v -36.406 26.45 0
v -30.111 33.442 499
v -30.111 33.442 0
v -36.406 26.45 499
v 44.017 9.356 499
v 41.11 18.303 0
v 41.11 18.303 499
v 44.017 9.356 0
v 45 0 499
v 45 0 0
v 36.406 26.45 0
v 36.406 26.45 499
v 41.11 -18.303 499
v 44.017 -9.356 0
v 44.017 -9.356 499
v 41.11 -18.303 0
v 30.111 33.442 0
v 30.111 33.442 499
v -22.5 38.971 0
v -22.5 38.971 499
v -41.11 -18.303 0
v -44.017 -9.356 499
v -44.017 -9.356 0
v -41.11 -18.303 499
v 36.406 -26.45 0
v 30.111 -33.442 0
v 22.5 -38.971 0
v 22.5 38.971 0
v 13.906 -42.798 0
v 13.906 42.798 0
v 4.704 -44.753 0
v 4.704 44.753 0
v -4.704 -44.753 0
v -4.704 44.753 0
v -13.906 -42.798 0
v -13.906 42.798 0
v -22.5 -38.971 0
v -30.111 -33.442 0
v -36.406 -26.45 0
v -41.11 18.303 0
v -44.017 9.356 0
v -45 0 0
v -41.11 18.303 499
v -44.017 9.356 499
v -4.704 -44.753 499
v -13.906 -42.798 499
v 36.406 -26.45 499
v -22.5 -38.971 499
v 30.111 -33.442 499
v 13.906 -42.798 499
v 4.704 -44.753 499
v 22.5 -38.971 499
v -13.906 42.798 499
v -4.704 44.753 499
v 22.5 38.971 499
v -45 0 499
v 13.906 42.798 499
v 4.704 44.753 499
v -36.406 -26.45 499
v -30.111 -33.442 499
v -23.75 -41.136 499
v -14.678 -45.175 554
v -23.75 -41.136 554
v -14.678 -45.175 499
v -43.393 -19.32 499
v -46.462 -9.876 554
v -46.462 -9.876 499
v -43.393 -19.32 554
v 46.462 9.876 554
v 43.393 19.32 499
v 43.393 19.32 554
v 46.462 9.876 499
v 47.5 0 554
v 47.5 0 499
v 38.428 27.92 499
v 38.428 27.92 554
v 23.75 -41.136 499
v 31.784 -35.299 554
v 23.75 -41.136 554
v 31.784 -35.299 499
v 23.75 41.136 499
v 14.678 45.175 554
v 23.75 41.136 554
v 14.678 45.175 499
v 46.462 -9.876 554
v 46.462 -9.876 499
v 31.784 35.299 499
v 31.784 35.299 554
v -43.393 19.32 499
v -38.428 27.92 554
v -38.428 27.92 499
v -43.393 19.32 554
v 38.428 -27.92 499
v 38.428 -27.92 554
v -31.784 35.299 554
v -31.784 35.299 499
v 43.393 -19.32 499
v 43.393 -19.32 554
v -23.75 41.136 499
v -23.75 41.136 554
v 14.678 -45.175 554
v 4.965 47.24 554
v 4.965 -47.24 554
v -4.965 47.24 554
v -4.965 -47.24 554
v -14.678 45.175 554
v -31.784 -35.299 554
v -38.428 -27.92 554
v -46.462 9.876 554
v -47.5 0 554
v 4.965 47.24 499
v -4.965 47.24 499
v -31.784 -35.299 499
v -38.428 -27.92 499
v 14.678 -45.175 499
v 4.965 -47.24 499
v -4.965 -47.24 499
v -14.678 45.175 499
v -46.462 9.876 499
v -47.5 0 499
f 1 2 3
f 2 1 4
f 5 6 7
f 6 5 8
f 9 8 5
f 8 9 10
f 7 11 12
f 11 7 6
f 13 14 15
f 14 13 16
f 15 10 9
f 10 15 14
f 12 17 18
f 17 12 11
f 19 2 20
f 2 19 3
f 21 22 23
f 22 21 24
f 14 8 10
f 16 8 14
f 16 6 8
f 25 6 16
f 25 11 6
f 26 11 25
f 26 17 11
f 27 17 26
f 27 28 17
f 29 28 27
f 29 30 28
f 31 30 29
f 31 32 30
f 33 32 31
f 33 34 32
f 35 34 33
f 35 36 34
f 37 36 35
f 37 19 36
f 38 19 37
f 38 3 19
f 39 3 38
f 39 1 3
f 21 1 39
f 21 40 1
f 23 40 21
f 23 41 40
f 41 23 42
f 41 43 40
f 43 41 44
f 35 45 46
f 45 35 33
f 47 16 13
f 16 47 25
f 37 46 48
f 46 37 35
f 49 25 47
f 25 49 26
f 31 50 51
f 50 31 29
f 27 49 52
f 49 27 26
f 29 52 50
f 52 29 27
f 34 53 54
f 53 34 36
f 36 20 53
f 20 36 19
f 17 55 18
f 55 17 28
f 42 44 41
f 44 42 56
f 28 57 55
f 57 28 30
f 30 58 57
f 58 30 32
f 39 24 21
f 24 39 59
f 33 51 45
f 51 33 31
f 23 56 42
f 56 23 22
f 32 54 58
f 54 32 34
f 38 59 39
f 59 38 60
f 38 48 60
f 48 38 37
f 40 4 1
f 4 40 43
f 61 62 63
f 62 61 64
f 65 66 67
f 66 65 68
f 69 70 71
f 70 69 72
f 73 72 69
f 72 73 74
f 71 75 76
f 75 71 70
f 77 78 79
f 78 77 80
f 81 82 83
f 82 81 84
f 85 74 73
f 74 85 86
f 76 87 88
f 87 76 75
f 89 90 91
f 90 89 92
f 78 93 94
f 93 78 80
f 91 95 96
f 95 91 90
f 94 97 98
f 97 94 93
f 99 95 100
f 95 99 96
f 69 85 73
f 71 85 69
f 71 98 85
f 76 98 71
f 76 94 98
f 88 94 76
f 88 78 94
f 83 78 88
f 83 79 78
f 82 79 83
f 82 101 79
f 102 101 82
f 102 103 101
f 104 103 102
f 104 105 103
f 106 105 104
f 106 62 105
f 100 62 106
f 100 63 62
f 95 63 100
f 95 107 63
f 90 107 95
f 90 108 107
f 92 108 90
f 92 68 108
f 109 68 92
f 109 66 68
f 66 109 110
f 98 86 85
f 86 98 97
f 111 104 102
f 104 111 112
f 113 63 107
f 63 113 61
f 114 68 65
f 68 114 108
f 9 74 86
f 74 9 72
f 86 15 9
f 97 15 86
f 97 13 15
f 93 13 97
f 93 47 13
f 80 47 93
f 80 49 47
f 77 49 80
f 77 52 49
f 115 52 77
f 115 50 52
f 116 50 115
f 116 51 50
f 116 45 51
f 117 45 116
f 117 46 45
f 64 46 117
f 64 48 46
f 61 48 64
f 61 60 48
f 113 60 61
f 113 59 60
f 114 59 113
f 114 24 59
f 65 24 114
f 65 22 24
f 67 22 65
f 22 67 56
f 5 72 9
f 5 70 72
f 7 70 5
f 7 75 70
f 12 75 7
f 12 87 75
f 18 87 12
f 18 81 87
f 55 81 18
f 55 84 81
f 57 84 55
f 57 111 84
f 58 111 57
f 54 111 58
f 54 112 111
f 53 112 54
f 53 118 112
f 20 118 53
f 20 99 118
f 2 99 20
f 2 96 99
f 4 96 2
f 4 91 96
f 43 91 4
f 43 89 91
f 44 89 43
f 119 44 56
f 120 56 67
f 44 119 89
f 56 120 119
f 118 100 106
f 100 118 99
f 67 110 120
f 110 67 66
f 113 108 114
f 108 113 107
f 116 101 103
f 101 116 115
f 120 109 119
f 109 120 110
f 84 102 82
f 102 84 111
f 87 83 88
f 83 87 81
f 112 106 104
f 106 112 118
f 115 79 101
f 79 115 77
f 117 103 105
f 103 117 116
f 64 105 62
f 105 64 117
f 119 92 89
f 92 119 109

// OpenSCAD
// Parameters
pipe_standard = 1; //[1:1:1]
nominal_diameter_mm = 90; //[50:180:1]
length_mm = 500; //[250:1000:1]
include_end_fitting = 1; //[0:1:1]
center = 0; //[0:1:1]
od_mm = 90; //[50:180:1]
wall_thickness_mm = 3.2; //[1.6:6.4:0.1]
socket_length_mm = 55; //[30:110:1]
socket_wall_extra_mm = 2.5; //[1:6:0.1]
socket_clearance_mm = 0.6; //[0.2:1.5:0.1]
overlap_mm = 1; //[0.5:2:0.1]

// HT Pipe - complete geometry
module ht_pipe() {
  color([0.85, 0.85, 0.8]) {
    // Outer pipe segment
    cylinder(h=length_mm, r=od_mm/2, center=false);

    // End fitting (socket)
    if (include_end_fitting) {
      translate([0, 0, length_mm - overlap_mm])
        cylinder(h=socket_length_mm, r=od_mm/2 + socket_wall_extra_mm, center=false);
    }

    // Hollow bore cutter
    difference() {
      // Outer pipe with fitting
      union() {
        cylinder(h=length_mm, r=od_mm/2, center=false);
        if (include_end_fitting) {
          translate([0, 0, length_mm - overlap_mm])
            cylinder(h=socket_length_mm, r=od_mm/2 + socket_wall_extra_mm, center=false);
        }
      }
      // Inner bore
      translate([0, 0, -overlap_mm])
        cylinder(h=length_mm + socket_length_mm + overlap_mm * 2, r=od_mm/2 - wall_thickness_mm, center=false);

      // Socket void
      if (include_end_fitting) {
        translate([0, 0, length_mm - overlap_mm * 2])
          cylinder(h=socket_length_mm + overlap_mm * 2, r=od_mm/2 + socket_clearance_mm, center=false);
      }
    }
  }
}

// Assembly
module assembly() {
  ht_pipe();
}

assembly();
